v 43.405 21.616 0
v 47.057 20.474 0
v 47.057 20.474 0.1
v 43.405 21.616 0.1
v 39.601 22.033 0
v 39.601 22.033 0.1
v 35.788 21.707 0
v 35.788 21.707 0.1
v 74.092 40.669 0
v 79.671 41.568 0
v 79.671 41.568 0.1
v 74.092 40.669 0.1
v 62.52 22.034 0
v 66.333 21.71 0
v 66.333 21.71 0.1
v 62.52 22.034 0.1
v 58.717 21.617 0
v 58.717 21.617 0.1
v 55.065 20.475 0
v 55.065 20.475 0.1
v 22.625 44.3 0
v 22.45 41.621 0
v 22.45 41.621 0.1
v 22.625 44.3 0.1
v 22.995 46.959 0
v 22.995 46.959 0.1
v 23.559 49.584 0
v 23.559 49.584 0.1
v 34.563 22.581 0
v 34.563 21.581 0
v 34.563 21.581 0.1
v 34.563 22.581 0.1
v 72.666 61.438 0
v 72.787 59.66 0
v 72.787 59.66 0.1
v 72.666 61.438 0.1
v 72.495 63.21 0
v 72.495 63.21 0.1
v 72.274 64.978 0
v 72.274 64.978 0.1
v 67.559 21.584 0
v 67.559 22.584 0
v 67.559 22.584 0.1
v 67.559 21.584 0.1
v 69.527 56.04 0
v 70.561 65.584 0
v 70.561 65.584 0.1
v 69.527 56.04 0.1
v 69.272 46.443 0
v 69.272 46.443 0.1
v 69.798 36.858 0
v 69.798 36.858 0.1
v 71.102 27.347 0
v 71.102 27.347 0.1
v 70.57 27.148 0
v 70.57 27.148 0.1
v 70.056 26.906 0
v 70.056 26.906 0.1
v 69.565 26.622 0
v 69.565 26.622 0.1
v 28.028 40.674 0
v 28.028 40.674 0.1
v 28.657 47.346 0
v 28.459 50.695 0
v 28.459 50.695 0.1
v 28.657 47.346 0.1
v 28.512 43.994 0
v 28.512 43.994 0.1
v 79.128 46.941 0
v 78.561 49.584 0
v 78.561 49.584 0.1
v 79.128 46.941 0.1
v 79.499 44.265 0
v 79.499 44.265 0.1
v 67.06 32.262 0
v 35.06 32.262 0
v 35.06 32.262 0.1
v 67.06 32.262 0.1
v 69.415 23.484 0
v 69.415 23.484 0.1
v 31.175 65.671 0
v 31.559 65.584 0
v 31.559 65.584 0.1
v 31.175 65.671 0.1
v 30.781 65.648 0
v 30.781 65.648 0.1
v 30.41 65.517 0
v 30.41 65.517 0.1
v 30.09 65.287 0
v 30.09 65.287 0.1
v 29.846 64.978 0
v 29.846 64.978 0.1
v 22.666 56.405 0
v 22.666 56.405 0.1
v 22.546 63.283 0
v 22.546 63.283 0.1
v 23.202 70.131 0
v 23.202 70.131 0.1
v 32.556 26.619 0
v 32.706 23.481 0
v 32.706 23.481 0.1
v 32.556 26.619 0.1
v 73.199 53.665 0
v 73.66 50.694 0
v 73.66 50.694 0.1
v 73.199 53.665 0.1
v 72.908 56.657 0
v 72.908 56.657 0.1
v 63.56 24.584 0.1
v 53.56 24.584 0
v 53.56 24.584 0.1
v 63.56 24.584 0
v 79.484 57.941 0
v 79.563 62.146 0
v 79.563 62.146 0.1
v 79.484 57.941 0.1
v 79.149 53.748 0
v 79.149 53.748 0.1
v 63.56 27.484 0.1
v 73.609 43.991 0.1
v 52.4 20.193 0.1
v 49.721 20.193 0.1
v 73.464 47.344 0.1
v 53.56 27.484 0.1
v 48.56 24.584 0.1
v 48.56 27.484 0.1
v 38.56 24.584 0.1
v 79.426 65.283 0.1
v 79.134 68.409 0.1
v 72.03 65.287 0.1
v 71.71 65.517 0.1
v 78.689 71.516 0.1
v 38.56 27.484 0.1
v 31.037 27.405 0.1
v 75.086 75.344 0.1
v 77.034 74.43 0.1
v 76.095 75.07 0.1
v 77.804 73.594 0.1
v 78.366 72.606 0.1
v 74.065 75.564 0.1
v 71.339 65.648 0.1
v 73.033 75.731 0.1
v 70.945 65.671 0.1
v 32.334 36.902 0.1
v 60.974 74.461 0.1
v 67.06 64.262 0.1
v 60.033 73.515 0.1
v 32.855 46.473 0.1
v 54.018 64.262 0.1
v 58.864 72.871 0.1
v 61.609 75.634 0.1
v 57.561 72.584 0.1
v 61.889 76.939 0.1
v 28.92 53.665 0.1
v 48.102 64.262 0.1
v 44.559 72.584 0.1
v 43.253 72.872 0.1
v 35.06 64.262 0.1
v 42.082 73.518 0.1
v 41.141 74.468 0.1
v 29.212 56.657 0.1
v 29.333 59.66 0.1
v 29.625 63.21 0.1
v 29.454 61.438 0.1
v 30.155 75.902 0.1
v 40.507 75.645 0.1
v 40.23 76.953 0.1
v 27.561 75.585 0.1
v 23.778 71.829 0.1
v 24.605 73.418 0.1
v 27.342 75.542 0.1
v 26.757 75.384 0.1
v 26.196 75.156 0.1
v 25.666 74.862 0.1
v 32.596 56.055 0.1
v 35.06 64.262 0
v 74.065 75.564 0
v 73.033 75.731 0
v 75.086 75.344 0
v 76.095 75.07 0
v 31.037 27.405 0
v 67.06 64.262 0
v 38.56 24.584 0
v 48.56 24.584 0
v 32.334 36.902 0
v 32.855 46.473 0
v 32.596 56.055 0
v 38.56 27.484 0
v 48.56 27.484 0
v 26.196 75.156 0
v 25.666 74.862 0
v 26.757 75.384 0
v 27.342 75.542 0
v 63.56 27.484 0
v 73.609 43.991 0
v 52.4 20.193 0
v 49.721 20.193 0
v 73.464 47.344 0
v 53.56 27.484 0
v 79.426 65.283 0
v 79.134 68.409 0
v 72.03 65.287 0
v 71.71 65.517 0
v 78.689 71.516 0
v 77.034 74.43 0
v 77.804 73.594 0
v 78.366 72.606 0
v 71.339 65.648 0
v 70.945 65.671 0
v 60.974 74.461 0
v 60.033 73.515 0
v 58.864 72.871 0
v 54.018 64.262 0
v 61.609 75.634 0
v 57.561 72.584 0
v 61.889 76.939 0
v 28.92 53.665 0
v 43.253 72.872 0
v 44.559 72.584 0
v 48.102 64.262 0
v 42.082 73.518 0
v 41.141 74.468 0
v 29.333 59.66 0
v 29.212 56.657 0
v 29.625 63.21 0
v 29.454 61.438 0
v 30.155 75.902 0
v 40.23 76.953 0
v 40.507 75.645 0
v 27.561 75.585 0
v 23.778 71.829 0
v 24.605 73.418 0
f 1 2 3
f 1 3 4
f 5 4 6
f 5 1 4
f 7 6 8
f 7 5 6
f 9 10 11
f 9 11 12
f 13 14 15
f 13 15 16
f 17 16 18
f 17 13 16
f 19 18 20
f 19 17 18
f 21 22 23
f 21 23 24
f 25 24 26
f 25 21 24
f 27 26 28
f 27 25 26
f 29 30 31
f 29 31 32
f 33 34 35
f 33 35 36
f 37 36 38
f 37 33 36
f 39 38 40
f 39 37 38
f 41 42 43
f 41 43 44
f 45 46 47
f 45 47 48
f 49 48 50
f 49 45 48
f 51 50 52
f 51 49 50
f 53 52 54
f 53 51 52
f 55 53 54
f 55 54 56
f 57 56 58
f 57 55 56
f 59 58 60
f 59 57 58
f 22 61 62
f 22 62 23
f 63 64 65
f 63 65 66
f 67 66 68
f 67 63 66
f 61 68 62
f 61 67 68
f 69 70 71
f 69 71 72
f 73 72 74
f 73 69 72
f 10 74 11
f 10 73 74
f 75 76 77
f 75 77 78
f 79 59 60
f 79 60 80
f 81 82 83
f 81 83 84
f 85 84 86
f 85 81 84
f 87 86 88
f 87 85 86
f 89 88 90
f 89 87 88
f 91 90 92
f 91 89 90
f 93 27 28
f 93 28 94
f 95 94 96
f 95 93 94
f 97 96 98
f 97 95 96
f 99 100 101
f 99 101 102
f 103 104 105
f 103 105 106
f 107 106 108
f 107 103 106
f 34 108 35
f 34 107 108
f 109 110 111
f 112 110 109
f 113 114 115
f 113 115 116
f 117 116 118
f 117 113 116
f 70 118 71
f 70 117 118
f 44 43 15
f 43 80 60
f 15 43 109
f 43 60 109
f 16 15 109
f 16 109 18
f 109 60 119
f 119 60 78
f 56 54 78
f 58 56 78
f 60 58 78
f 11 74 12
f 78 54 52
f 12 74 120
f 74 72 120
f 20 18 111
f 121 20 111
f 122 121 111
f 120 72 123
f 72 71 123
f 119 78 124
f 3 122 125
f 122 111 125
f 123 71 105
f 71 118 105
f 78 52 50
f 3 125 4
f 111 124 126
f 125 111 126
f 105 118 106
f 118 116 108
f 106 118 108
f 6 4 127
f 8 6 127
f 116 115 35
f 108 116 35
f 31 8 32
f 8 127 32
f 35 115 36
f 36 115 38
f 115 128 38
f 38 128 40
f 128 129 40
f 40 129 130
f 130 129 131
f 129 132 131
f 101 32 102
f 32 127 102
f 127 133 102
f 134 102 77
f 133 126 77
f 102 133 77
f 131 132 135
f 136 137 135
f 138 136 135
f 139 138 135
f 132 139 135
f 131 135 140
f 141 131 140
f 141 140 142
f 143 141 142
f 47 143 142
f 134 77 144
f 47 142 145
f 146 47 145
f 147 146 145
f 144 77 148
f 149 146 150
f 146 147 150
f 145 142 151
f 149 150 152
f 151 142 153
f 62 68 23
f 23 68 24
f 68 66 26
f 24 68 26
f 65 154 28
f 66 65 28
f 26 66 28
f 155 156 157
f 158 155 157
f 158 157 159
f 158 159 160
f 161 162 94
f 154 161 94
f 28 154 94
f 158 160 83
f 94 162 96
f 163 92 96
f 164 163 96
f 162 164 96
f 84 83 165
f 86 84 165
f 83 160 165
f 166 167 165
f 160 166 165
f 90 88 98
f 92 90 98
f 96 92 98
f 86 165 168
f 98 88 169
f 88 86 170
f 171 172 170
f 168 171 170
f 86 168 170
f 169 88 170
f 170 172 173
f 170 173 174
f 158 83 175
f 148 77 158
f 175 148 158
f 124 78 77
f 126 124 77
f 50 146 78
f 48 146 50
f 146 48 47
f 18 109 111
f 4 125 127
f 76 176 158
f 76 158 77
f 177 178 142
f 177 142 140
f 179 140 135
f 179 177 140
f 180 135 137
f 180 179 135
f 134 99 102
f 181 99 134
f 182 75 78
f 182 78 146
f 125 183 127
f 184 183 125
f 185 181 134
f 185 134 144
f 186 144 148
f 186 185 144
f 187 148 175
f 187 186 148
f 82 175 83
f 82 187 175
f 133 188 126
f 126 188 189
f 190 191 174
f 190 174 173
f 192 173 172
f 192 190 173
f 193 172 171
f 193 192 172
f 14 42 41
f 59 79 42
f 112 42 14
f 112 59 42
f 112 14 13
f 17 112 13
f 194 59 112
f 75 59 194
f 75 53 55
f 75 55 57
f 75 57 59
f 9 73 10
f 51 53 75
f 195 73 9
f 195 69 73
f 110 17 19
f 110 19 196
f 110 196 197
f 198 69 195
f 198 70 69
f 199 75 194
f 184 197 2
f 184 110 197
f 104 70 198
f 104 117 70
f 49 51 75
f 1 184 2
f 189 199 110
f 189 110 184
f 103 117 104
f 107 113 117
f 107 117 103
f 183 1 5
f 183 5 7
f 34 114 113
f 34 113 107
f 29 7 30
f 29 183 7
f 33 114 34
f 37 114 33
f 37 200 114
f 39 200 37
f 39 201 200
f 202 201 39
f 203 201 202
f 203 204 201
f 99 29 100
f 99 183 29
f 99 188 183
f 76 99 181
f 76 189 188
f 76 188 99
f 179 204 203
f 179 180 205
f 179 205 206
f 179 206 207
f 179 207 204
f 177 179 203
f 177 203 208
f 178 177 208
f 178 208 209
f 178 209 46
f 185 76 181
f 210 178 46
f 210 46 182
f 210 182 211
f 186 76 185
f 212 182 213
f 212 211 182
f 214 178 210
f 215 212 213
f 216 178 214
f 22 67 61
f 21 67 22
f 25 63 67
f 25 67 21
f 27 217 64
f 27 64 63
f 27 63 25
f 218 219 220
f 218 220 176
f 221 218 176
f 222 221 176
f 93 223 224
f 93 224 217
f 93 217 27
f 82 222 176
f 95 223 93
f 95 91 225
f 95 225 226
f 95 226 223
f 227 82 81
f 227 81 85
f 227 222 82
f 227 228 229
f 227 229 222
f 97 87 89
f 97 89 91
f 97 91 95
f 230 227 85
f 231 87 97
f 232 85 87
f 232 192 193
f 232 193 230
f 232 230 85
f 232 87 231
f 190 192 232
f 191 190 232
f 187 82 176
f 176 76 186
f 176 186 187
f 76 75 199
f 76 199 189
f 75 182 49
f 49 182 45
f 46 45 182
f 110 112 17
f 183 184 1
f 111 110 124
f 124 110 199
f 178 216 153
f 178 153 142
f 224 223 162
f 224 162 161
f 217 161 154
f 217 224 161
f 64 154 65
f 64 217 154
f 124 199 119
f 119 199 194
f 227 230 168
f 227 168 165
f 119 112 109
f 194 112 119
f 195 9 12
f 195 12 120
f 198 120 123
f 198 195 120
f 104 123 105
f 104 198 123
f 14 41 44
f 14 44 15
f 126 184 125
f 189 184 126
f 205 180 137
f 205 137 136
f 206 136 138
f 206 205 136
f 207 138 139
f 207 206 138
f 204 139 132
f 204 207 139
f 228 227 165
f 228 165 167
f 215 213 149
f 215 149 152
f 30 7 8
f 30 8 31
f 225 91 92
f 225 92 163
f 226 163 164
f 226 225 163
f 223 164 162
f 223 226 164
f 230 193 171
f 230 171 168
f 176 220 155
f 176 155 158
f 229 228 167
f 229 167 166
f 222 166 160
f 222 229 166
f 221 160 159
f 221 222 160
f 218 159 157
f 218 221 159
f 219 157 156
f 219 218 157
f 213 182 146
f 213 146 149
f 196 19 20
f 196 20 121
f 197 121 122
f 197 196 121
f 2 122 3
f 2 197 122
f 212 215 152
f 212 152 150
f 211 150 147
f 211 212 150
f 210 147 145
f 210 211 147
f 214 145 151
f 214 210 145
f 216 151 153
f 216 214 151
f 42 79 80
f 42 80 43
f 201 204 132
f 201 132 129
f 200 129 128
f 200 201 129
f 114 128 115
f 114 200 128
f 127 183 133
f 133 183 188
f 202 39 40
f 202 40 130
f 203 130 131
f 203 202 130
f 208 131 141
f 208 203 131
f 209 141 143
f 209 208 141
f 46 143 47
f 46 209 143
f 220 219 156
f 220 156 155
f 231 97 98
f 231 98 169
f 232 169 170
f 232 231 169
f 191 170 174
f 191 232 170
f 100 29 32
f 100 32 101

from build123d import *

# Parameters (mm, degrees)
MODEL_W                 = 10
MODEL_H                 = 2.9
SALIENTE_EXTRUIR1_DEPTH = 0.1


with BuildPart() as part:
    # Model → Saliente-Extruir1 (new body)
    with BuildSketch(Plane.XY):
        with BuildLine():
            Line((35.788328911, 21.707483708), (34.562799173, 21.581308157))
            Line((34.562799173, 21.581308157), (34.562652828, 22.581308147))
            Line((34.562652828, 22.581308147), (32.70612679, 23.481266233))
            Line((32.70612679, 23.481266233), (32.556235076, 26.619326304))
            Line((32.556235076, 26.619326304), (31.036614796, 27.404548337))
            ThreePointArc((31.036614796, 27.404548337), (32.854753025, 46.472842043), (31.55872141, 65.583722544))
            ThreePointArc((31.55872141, 65.583722544), (30.590969531, 65.595574241), (29.845859092, 64.977921752))
            ThreePointArc((29.845859092, 64.977921752), (29.533169752, 62.324588377), (29.332558898, 59.660435997))
            ThreePointArc((29.332558898, 59.660435997), (29.087424273, 55.159098423), (28.459158768, 50.695085274))
            ThreePointArc((28.459158768, 50.695085274), (28.627310402, 45.667965845), (28.027763798, 40.673894501))
            Line((28.027763798, 40.673894501), (22.450336553, 41.621102944))
            ThreePointArc((22.450336553, 41.621102944), (22.785375557, 45.632918576), (23.55872141, 49.583722544))
            ThreePointArc((23.55872141, 49.583722544), (22.508827615, 59.842451026), (23.202312308, 70.131419197))
            ThreePointArc((23.202312308, 70.131419197), (24.161095869, 72.639029062), (25.666362665, 74.861987681))
            ThreePointArc((25.666362665, 74.861987681), (26.473042164, 75.27855447), (27.341750173, 75.542384144))
            Line((27.341750173, 75.542384144), (27.561102277, 75.584512547))
            Line((27.561102277, 75.584512547), (30.155444554, 75.902266174))
            Line((30.155444554, 75.902266174), (40.23046228, 76.952955231))
            ThreePointArc((40.23046228, 76.952955231), (41.577753061, 73.95916021), (44.55872141, 72.583722544))
            Line((44.55872141, 72.583722544), (48.101813752, 64.261756561))
            Line((48.101813752, 64.261756561), (35.059978867, 64.261756561))
            Line((35.059978867, 64.261756561), (35.059978867, 32.261756561))
            Line((35.059978867, 32.261756561), (67.059978867, 32.261756561))
            Line((67.059978867, 32.261756561), (67.059978867, 64.261756561))
            Line((67.059978867, 64.261756561), (54.018143983, 64.261756561))
            Line((54.018143983, 64.261756561), (57.561236324, 72.583722544))
            ThreePointArc((57.561236324, 72.583722544), (60.537265907, 73.954182145), (61.888562624, 76.938961663))
            Line((61.888562624, 76.938961663), (73.033030733, 75.731471954))
            ThreePointArc((73.033030733, 75.731471954), (74.577070762, 75.460810441), (76.095189277, 75.070127146))
            ThreePointArc((76.095189277, 75.070127146), (77.804128562, 73.593895905), (78.689246297, 71.516325509))
            ThreePointArc((78.689246297, 71.516325509), (79.299082123, 66.847407918), (79.563217831, 62.146245983))
            ThreePointArc((79.563217831, 62.146245983), (79.348252658, 55.842170985), (78.561236324, 49.583722544))
            ThreePointArc((78.561236324, 49.583722544), (79.338265829, 45.606384219), (79.67109964, 41.567545691))
            Line((79.67109964, 41.567545691), (74.092351811, 40.669243886))
            ThreePointArc((74.092351811, 40.669243886), (73.494321928, 45.665313622), (73.659828166, 50.694325476))
            ThreePointArc((73.659828166, 50.694325476), (73.032031827, 55.158739267), (72.787398837, 59.660435997))
            ThreePointArc((72.787398837, 59.660435997), (72.586787983, 62.324588377), (72.274098643, 64.977921752))
            ThreePointArc((72.274098643, 64.977921752), (71.528988204, 65.595574241), (70.561236324, 65.583722544))
            ThreePointArc((70.561236324, 65.583722544), (69.272286317, 46.443233149), (71.102210852, 27.346869554))
            ThreePointArc((71.102210852, 27.346869554), (70.310817444, 27.032315031), (69.5645482, 26.622034286))
            Line((69.5645482, 26.622034286), (69.415115725, 23.483952313))
            Line((69.415115725, 23.483952313), (67.55872141, 22.583722544))
            Line((67.55872141, 22.583722544), (67.55872141, 21.583722544))
            Line((67.55872141, 21.583722544), (66.33317322, 21.709718743))
            ThreePointArc((66.33317322, 21.709718743), (60.608385736, 21.918148973), (55.064572652, 20.474967974))
            ThreePointArc((55.064572652, 20.474967974), (51.060864546, 20.157739519), (47.057110058, 20.47438205))
            ThreePointArc((47.057110058, 20.47438205), (41.513085831, 21.916751726), (35.788328911, 21.707483708))
        make_face()
        with Locations((58.559978867, 26.033722544)):
            Rectangle(MODEL_W, MODEL_H, mode=Mode.SUBTRACT)
        with Locations((43.559978867, 26.033722544)):
            Rectangle(MODEL_W, MODEL_H, mode=Mode.SUBTRACT)
    extrude(amount=SALIENTE_EXTRUIR1_DEPTH)


solid = part.part
